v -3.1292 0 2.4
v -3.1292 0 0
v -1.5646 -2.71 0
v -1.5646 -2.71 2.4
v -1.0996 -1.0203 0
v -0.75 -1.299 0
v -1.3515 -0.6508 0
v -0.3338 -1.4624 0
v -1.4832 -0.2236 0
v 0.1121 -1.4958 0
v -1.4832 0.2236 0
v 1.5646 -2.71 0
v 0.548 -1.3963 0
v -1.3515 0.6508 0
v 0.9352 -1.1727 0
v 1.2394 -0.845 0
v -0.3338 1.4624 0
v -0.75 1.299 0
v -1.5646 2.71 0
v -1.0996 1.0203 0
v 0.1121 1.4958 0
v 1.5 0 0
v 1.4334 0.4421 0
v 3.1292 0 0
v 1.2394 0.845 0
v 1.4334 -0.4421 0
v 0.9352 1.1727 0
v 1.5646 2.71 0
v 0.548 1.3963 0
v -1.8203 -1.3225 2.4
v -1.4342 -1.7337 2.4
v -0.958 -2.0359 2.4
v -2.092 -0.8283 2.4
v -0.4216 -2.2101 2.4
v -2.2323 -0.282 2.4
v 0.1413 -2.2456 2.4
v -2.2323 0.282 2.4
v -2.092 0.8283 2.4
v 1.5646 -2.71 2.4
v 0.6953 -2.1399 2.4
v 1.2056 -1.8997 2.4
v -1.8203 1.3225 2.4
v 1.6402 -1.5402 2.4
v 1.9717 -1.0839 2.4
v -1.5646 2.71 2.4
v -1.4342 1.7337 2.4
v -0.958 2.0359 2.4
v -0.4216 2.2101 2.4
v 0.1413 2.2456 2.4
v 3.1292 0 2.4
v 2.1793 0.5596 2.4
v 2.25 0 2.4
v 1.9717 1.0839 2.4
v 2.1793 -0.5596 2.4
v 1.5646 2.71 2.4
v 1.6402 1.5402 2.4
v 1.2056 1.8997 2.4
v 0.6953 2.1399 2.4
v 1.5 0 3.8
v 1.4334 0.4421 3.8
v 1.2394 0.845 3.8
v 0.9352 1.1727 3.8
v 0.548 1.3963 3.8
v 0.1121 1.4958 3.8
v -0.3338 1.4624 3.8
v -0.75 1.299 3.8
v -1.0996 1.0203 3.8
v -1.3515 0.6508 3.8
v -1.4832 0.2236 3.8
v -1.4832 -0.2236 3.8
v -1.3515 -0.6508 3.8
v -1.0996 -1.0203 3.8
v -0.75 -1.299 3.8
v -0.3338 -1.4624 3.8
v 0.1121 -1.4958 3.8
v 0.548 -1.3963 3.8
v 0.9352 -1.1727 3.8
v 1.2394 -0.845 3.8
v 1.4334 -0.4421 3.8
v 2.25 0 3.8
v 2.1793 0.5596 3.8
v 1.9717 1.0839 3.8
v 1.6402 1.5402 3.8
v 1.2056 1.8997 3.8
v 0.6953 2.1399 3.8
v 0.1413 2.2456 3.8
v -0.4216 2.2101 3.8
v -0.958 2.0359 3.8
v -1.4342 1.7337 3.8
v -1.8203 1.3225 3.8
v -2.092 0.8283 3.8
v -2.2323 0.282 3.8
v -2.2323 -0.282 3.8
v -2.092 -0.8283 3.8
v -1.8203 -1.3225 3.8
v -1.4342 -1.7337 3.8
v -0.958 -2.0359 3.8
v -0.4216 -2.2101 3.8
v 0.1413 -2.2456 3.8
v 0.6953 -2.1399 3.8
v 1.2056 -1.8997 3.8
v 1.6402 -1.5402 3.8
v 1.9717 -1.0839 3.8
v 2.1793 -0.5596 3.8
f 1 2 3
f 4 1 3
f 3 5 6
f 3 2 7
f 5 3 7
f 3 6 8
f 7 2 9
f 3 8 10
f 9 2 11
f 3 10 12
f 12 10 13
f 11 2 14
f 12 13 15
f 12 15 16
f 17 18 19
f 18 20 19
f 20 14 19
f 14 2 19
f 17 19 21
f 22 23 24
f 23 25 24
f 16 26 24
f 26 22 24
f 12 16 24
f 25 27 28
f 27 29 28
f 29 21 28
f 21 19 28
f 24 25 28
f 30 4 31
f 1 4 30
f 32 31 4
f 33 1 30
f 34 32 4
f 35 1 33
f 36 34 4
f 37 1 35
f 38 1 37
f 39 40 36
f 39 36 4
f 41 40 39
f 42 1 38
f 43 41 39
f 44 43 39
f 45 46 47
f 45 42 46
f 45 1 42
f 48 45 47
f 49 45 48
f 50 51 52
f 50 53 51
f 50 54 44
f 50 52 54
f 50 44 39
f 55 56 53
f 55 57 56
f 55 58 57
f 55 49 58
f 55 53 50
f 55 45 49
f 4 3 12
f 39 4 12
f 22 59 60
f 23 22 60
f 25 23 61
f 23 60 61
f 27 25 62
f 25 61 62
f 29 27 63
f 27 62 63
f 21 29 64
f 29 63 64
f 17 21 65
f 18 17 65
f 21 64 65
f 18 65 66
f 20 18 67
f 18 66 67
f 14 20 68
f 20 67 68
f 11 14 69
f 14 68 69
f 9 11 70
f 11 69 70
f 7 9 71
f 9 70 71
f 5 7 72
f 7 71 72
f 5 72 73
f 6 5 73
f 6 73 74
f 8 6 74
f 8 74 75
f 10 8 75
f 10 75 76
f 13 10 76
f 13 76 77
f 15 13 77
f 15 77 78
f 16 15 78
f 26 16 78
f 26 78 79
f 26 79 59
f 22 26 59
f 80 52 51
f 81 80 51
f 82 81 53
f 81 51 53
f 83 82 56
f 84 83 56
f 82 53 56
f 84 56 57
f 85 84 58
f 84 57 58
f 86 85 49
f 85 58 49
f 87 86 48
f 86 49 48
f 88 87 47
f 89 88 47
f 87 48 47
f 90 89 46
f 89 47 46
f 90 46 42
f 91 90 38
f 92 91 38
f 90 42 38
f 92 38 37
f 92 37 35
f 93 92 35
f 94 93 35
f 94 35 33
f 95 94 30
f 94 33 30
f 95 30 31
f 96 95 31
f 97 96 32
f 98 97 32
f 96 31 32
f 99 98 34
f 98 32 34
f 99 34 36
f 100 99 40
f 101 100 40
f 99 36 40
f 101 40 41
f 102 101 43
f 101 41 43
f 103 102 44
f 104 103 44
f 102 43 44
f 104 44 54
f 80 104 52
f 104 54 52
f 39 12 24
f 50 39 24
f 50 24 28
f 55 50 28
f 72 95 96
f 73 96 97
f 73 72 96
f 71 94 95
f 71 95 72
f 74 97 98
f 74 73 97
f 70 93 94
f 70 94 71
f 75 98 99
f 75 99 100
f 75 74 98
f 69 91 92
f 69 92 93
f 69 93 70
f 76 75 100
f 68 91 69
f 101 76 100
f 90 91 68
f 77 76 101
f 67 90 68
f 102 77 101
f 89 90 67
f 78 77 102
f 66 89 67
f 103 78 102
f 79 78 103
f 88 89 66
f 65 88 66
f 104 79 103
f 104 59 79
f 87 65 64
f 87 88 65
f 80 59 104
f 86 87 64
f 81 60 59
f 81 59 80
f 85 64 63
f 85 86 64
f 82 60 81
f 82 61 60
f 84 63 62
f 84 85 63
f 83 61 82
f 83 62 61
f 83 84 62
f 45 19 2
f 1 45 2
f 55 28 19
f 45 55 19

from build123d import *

# Parameters (mm, degrees)
EXTRUDE_1_DEPTH     = 2.4
SKETCH_2_R          = 2.25
EXTRUDE_2_DEPTH     = 1.4
SKETCH_3_R          = 1.5
CUT_EXTRUDE_1_DEPTH = 4.4


with BuildPart() as part:
    # 草图1 → 凸台-拉伸1 (new body)
    with BuildSketch(Plane.XY):
        Polygon((3.129238459, 0), (1.56461923, 2.71), (-1.56461923, 2.71), (-3.129238459, 0), (-1.56461923, -2.71), (1.56461923, -2.71), align=None)
    extrude(amount=EXTRUDE_1_DEPTH)

    # 草图2 → 凸台-拉伸2 (add)
    with BuildSketch(Plane.XY.offset(2.4)):
        Circle(SKETCH_2_R)
    extrude(amount=EXTRUDE_2_DEPTH)

    # 草图3 → 切除-拉伸1 (cut)
    with BuildSketch(Plane.XY.offset(3.8)):
        Circle(SKETCH_3_R)
    extrude(amount=-CUT_EXTRUDE_1_DEPTH, mode=Mode.SUBTRACT)


solid = part.part
